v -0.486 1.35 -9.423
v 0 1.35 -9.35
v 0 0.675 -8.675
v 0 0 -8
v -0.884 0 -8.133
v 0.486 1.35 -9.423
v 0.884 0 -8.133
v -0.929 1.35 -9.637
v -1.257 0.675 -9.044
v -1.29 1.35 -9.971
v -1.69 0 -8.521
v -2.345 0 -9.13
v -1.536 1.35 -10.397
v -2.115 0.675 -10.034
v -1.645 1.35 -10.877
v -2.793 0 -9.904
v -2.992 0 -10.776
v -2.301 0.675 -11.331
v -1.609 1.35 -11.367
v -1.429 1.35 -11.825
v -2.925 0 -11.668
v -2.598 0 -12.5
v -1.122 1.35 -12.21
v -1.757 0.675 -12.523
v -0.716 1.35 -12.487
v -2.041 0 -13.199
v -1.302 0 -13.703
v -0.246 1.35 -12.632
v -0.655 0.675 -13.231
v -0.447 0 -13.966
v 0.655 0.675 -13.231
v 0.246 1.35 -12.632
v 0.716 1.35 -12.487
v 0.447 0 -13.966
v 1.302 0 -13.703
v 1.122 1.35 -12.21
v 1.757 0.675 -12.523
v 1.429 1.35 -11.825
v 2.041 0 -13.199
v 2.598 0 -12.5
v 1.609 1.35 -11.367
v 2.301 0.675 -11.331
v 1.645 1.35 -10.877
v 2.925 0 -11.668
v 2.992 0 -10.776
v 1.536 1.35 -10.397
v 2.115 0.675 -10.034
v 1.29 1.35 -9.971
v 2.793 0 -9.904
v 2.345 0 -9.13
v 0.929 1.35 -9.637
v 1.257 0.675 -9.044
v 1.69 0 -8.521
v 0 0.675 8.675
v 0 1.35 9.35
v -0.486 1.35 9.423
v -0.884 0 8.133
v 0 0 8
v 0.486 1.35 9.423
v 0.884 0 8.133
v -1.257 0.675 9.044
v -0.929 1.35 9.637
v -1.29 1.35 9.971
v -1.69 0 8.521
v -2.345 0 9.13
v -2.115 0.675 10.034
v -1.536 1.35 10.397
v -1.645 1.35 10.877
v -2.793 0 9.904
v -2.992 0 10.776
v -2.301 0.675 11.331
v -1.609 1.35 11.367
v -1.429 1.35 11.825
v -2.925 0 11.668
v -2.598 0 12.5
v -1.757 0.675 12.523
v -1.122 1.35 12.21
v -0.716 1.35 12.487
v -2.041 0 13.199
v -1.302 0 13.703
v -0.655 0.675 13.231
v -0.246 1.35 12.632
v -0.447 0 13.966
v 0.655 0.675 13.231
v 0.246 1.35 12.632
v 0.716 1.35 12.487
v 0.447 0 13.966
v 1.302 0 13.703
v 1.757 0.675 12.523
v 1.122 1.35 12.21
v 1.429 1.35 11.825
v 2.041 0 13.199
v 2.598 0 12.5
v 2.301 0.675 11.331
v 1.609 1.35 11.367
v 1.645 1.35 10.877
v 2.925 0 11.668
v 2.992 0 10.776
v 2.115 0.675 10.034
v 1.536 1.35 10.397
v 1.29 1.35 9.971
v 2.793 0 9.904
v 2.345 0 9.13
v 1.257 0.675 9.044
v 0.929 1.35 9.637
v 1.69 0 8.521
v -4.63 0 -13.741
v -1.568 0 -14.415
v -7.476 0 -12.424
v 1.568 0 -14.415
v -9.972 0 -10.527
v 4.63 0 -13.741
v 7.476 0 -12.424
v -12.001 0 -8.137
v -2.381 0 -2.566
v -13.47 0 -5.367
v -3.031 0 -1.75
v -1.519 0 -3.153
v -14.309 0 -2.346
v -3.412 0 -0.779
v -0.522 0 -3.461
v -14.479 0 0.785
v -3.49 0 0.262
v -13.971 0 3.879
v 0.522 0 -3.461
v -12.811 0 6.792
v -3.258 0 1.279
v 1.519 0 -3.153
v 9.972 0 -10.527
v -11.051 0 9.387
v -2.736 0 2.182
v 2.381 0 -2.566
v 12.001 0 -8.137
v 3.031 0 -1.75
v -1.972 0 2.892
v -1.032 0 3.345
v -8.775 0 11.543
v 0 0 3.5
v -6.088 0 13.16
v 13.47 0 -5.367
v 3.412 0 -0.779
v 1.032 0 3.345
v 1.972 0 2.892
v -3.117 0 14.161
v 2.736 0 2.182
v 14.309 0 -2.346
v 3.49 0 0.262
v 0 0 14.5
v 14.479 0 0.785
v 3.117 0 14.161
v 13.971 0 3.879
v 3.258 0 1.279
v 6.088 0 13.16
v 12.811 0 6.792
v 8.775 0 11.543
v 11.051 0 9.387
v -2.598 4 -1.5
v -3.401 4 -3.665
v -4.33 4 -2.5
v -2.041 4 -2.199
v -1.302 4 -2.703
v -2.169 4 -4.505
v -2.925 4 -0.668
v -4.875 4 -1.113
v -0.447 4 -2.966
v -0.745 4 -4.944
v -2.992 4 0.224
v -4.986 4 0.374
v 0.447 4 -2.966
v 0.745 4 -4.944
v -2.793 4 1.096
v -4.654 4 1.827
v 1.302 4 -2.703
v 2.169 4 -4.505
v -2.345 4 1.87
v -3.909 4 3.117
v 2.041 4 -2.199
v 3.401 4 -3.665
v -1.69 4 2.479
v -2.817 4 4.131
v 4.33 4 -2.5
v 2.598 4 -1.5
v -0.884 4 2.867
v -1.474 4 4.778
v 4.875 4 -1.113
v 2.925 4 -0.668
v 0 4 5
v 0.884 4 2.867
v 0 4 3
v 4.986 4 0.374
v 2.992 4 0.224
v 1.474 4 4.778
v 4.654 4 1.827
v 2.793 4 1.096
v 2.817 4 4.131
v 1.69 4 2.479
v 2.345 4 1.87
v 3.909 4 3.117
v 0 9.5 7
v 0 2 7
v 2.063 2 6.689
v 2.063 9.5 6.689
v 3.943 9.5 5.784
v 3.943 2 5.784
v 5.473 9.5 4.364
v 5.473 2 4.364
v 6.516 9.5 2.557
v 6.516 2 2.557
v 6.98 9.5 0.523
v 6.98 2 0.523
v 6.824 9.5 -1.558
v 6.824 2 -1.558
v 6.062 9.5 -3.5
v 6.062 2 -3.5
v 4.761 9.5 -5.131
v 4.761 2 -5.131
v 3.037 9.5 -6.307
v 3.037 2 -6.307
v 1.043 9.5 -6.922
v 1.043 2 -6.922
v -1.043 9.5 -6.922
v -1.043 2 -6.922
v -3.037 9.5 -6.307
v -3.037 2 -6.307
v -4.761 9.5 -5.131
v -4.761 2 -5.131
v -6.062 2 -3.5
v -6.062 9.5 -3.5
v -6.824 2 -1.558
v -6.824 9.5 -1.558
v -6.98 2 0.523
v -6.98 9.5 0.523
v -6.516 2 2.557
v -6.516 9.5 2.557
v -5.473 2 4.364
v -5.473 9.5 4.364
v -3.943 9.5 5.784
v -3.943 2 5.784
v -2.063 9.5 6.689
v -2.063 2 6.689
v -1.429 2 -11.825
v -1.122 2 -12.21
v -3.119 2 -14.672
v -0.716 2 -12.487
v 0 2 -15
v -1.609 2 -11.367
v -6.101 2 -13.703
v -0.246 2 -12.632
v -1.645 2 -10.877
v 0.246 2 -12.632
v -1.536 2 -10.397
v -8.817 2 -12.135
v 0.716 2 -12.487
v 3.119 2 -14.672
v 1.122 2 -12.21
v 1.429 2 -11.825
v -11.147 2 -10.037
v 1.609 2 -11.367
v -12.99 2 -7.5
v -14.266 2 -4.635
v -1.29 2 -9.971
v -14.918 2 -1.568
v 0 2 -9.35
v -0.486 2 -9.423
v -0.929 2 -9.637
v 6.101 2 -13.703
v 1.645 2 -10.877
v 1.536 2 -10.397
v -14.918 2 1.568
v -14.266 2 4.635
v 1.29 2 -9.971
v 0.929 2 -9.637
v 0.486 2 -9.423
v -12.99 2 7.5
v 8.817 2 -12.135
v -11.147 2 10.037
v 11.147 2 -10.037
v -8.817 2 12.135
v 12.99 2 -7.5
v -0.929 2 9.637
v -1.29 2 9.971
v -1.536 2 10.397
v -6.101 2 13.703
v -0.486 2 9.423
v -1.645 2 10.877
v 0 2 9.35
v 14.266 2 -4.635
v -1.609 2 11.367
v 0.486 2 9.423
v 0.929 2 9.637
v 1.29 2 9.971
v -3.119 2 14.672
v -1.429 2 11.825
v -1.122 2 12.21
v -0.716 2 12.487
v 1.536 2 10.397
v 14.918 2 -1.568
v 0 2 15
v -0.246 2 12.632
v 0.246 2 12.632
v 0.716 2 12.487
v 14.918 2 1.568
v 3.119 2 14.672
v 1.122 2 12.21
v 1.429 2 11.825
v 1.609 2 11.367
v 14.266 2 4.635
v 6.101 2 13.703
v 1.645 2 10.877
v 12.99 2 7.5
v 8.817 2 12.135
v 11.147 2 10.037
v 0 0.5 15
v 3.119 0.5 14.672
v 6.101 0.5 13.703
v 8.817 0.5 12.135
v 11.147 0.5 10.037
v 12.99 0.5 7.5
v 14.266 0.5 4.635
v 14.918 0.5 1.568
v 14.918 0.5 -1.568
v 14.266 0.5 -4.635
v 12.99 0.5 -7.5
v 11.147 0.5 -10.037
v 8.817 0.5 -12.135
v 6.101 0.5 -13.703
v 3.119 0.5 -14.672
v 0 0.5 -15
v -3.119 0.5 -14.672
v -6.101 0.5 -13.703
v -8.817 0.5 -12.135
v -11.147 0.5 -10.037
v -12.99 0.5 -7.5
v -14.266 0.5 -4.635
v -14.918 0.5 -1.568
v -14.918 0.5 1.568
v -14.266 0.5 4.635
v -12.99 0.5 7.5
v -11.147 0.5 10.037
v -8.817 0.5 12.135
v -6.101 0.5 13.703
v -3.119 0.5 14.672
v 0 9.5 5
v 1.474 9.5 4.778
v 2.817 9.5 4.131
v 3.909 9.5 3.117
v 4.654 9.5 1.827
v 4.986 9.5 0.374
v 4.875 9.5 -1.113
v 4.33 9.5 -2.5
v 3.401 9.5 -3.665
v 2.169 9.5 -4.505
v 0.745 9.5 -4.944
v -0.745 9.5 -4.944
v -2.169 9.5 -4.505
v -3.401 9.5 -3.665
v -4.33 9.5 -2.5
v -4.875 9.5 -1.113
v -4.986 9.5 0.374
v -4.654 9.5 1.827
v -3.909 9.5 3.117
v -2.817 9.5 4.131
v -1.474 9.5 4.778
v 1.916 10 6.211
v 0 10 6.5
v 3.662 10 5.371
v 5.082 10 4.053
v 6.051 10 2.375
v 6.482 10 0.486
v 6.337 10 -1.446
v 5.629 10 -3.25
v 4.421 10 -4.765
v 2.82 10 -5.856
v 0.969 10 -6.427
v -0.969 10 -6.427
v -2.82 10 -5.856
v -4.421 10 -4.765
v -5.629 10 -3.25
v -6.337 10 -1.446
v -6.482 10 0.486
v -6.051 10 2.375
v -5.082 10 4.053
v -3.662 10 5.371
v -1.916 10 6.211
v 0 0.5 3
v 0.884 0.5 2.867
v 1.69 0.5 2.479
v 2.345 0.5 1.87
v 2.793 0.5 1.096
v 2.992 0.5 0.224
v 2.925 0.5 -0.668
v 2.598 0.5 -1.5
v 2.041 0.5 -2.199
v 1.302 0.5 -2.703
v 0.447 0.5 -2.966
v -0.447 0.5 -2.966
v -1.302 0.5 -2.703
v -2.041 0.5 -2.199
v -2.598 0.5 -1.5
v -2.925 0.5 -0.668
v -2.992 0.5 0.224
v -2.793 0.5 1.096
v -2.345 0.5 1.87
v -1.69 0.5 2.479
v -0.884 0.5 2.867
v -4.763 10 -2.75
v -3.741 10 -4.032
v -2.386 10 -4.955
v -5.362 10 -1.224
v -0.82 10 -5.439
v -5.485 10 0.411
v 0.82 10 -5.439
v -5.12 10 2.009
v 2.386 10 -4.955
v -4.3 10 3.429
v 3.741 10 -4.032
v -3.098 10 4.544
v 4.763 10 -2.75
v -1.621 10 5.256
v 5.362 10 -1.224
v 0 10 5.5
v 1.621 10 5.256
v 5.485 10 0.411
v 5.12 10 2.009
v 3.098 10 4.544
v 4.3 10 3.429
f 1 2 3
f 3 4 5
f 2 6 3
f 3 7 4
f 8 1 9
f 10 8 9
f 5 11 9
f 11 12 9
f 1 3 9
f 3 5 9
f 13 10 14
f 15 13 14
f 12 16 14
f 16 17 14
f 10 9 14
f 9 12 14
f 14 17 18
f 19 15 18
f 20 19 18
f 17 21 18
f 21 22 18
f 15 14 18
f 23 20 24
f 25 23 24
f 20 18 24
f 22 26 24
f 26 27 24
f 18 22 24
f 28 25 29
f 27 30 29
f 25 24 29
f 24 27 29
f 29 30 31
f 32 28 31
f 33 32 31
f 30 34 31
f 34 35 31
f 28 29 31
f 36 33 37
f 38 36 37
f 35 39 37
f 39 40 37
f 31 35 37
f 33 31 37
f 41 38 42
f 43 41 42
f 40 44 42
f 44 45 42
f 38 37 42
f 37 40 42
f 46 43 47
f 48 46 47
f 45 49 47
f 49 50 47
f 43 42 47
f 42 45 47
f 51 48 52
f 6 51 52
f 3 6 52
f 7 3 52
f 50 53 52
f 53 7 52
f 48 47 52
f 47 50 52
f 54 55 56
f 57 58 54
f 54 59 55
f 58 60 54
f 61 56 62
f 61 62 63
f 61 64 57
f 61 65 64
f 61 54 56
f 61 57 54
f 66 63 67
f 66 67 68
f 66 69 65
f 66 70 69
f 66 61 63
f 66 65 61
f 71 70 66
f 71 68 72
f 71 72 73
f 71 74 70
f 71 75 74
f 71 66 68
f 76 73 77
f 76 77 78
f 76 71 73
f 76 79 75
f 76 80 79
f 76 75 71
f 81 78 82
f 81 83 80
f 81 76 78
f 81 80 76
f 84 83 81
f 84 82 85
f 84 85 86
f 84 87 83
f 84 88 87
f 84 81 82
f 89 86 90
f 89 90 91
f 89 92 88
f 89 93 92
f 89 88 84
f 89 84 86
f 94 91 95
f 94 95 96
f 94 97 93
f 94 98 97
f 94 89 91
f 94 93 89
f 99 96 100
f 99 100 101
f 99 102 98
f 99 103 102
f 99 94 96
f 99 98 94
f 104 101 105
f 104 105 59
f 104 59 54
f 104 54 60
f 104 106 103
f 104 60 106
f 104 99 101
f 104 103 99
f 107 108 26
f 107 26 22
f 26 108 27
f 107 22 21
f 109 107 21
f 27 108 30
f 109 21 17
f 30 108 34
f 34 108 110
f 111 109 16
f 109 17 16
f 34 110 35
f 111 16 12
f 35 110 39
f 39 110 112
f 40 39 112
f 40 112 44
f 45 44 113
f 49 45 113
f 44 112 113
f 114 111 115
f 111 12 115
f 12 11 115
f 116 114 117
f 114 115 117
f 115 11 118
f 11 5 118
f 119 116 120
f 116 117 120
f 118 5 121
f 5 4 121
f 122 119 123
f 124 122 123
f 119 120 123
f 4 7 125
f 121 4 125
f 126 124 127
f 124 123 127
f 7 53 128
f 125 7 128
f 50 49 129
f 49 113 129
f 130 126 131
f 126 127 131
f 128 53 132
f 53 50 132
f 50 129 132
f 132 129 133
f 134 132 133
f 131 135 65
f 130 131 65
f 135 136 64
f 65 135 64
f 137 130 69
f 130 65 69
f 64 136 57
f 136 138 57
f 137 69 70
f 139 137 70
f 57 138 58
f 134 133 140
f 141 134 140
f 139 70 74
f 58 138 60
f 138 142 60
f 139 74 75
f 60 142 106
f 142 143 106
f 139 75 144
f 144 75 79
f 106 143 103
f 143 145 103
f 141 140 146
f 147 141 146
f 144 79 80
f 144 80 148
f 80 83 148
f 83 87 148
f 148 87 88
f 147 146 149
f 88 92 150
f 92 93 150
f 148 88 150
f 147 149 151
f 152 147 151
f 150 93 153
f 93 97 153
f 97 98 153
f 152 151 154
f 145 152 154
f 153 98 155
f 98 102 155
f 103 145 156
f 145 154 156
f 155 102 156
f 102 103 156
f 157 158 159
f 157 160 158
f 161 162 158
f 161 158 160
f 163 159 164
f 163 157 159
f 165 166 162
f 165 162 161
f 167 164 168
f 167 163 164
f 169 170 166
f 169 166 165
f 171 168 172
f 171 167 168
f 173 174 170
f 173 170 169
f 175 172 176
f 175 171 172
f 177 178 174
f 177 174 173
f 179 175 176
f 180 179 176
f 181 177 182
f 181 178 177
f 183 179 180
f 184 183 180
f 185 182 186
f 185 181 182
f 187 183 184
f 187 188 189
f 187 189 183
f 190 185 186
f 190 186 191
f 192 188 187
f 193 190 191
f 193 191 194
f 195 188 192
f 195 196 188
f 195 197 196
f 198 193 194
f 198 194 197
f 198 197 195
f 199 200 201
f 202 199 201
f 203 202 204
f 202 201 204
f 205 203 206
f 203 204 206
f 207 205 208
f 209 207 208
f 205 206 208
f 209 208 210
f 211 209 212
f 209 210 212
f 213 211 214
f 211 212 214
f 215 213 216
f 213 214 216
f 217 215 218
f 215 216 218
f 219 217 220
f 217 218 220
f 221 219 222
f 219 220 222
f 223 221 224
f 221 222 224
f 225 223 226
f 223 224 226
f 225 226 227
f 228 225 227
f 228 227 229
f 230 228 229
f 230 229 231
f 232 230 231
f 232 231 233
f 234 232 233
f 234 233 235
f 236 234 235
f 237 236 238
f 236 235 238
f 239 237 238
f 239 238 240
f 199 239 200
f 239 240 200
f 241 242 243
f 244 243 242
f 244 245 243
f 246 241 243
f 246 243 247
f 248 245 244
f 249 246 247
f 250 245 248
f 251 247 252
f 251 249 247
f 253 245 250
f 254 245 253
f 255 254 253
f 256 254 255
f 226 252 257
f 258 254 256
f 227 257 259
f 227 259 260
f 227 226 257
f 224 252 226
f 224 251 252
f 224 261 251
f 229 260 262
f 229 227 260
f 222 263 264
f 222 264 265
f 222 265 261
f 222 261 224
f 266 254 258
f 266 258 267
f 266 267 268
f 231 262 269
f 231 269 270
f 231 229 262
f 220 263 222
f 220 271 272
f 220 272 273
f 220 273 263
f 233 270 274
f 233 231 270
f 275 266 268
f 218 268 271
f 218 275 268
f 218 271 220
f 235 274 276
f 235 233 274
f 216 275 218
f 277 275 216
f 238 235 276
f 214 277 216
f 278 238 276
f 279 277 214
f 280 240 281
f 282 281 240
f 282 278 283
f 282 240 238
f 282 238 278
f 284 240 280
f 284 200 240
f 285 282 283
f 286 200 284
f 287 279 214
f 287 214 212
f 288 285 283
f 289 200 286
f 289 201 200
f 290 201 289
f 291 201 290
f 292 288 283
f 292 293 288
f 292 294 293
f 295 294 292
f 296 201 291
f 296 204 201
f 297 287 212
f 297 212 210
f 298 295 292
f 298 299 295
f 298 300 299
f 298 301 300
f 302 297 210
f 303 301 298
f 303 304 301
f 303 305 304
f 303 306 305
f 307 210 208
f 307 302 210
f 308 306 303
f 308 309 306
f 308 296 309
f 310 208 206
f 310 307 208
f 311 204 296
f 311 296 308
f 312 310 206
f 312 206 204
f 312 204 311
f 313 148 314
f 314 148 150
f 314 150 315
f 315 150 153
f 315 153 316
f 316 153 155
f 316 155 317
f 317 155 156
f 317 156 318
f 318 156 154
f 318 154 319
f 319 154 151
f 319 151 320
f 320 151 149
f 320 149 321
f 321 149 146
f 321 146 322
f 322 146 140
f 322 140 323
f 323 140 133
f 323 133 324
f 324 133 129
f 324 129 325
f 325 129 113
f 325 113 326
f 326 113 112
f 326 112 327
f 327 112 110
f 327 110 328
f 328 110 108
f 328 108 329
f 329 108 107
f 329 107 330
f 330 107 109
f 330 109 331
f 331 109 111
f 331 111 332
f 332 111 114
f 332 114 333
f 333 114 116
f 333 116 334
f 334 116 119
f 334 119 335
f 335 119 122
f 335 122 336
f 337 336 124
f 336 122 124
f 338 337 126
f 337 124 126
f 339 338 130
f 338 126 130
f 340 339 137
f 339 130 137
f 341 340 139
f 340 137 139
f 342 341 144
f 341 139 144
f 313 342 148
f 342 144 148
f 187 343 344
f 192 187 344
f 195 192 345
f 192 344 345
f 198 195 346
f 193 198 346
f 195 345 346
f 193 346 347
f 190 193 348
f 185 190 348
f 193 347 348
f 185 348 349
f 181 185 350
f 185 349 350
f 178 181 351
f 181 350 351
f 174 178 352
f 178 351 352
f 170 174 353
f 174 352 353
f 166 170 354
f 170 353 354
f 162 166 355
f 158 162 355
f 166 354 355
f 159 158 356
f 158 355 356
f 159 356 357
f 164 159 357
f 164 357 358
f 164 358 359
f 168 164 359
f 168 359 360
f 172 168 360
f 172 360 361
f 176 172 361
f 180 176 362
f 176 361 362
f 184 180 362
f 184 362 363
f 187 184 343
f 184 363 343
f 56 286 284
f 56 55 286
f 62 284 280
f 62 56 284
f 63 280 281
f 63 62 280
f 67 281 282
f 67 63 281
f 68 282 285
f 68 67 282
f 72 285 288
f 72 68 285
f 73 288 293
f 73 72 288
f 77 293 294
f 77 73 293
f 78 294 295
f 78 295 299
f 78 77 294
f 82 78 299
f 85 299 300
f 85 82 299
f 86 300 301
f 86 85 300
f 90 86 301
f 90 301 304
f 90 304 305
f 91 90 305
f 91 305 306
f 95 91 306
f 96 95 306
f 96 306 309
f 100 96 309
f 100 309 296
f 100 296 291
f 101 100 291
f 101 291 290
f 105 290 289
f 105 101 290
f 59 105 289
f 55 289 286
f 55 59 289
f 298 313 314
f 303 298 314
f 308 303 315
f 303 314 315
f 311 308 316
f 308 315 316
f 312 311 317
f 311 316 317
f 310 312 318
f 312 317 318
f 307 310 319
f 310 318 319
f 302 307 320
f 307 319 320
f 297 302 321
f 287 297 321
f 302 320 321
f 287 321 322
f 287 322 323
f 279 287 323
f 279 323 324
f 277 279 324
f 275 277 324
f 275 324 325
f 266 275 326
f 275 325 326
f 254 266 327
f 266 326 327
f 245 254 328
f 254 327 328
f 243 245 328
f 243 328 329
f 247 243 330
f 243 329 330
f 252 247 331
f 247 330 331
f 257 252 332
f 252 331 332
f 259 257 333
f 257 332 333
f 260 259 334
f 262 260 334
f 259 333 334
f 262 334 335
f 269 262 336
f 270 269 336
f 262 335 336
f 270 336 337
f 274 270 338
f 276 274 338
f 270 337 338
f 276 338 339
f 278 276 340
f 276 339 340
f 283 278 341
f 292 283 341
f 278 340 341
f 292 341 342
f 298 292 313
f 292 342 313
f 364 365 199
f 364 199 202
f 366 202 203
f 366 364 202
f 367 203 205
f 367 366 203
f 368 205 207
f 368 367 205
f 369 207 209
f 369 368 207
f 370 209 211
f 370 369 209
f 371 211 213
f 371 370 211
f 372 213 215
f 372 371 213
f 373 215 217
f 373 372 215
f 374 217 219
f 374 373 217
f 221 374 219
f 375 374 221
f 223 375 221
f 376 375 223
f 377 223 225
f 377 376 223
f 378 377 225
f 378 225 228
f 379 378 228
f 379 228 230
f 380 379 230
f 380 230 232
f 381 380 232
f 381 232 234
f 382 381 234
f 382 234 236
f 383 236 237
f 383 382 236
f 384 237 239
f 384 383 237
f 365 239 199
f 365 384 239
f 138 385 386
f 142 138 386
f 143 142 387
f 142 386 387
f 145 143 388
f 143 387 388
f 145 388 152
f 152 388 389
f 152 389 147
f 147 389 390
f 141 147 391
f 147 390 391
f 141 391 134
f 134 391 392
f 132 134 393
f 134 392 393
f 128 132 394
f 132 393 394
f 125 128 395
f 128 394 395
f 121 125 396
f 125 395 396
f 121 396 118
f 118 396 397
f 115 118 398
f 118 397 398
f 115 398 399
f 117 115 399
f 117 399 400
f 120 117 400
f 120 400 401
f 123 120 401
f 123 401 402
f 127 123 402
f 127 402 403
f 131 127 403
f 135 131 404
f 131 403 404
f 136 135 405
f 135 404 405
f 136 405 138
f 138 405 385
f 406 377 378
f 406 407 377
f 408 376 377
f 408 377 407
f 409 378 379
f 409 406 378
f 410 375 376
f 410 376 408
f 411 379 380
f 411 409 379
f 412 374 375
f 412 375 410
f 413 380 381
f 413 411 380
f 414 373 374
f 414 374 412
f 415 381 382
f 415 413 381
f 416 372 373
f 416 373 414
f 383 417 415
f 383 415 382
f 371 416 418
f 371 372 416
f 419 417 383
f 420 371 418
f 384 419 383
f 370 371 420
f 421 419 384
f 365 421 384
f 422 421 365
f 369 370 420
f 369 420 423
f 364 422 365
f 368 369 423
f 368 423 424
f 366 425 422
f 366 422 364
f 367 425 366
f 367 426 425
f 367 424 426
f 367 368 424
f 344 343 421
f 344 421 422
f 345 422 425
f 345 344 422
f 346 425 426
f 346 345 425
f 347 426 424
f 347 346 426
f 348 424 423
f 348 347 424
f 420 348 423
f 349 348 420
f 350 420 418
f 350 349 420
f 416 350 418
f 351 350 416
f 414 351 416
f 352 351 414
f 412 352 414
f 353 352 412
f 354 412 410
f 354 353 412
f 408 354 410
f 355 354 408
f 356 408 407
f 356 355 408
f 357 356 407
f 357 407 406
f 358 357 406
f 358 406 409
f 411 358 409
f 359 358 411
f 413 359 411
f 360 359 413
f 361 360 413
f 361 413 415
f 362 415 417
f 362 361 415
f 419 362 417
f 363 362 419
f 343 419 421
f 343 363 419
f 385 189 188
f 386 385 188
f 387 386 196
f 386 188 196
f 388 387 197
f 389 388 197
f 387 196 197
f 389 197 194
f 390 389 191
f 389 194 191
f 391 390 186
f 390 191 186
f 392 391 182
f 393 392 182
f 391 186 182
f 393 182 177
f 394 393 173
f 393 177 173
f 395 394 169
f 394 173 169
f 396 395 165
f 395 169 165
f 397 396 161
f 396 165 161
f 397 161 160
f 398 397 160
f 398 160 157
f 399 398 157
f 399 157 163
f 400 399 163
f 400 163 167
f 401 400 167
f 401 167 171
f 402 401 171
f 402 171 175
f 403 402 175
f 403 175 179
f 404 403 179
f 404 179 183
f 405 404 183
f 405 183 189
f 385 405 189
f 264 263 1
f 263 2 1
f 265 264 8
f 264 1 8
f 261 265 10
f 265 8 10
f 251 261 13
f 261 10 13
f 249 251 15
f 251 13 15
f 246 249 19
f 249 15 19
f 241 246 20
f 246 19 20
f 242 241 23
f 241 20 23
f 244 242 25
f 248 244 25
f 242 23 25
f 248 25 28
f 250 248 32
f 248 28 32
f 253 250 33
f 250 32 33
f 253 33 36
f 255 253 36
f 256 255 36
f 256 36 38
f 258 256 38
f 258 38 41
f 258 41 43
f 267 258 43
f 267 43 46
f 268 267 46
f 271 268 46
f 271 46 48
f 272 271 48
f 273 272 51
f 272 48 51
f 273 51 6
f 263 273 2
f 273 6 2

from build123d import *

# Parameters (mm, degrees)
SKETCH_1_R          = 15
EXTRUDE_1_DEPTH     = 2
SKETCH_2_R          = 7
EXTRUDE_2_DEPTH     = 8
SKETCH_3_R          = 5
CUT_EXTRUDE_1_DEPTH = 6
SKETCH_4_R          = 3
CUT_EXTRUDE_2_DEPTH = 23.045407685
CHAMFER_1_SIZE      = 0.5


with BuildPart() as part:
    # 草图1 → 凸台-拉伸1 (new body)
    with BuildSketch(Plane(origin=(0, 0, 0), x_dir=(1, 0, 0), z_dir=(0, 1, 0))):
        with Locations(Location((0, 0, 0), (0, 0, 270))):
            Circle(SKETCH_1_R)
    extrude(amount=EXTRUDE_1_DEPTH)

    # 草图2 → 凸台-拉伸2 (add)
    with BuildSketch(Plane(origin=(0, 2, 0), x_dir=(1, 0, 0), z_dir=(0, 1, 0))):
        with Locations(Location((0, 0, 0), (0, 0, 270))):
            Circle(SKETCH_2_R)
    extrude(amount=EXTRUDE_2_DEPTH)

    # 草图3 → 切除-拉伸1 (cut)
    with BuildSketch(Plane(origin=(0, 10, 0), x_dir=(1, 0, 0), z_dir=(0, 1, 0))):
        with Locations(Location((0, 0, 0), (0, 0, 270))):
            Circle(SKETCH_3_R)
    extrude(amount=-CUT_EXTRUDE_1_DEPTH, mode=Mode.SUBTRACT)

    # 草图4 → 切除-拉伸2 (cut, through all)
    with BuildSketch(Plane(origin=(0, 4, 0), x_dir=(1, 0, 0), z_dir=(0, 1, 0))):
        with Locations(Location((0, 0, 0), (0, 0, 270))):
            Circle(SKETCH_4_R)
    extrude(amount=-CUT_EXTRUDE_2_DEPTH, mode=Mode.SUBTRACT)

    # 倒角1
    chamfer_1_edges = [part.edges().sort_by_distance(p)[0] for p in [
        (0, 10, -5),
        (0, 0, -3),
        (0, 0, -15),
        (0, 10, -7),
    ]]
    chamfer(chamfer_1_edges, length=CHAMFER_1_SIZE)

    # 草图8 → M6 内六角花形半沉头螺钉的锥形沉头孔1 (revolve, cut)
    with BuildSketch(Plane(origin=(0, 0, 11), x_dir=(0, 0, -1), z_dir=(1, 0, 0))):
        Polygon((0, 0), (0, 3.65), (1.65, 2), (1.65, 1.35), (3, 0), align=None)
    hole_wizard_m6_1 = revolve(axis=Axis((0, -6.35, 11), (0, 1, 0)), mode=Mode.SUBTRACT)

    # 镜向1: M6 内六角花形半沉头螺钉的锥形沉头孔1 across plane
    add(hole_wizard_m6_1.mirror(Plane.XY), mode=Mode.SUBTRACT)


solid = part.part
